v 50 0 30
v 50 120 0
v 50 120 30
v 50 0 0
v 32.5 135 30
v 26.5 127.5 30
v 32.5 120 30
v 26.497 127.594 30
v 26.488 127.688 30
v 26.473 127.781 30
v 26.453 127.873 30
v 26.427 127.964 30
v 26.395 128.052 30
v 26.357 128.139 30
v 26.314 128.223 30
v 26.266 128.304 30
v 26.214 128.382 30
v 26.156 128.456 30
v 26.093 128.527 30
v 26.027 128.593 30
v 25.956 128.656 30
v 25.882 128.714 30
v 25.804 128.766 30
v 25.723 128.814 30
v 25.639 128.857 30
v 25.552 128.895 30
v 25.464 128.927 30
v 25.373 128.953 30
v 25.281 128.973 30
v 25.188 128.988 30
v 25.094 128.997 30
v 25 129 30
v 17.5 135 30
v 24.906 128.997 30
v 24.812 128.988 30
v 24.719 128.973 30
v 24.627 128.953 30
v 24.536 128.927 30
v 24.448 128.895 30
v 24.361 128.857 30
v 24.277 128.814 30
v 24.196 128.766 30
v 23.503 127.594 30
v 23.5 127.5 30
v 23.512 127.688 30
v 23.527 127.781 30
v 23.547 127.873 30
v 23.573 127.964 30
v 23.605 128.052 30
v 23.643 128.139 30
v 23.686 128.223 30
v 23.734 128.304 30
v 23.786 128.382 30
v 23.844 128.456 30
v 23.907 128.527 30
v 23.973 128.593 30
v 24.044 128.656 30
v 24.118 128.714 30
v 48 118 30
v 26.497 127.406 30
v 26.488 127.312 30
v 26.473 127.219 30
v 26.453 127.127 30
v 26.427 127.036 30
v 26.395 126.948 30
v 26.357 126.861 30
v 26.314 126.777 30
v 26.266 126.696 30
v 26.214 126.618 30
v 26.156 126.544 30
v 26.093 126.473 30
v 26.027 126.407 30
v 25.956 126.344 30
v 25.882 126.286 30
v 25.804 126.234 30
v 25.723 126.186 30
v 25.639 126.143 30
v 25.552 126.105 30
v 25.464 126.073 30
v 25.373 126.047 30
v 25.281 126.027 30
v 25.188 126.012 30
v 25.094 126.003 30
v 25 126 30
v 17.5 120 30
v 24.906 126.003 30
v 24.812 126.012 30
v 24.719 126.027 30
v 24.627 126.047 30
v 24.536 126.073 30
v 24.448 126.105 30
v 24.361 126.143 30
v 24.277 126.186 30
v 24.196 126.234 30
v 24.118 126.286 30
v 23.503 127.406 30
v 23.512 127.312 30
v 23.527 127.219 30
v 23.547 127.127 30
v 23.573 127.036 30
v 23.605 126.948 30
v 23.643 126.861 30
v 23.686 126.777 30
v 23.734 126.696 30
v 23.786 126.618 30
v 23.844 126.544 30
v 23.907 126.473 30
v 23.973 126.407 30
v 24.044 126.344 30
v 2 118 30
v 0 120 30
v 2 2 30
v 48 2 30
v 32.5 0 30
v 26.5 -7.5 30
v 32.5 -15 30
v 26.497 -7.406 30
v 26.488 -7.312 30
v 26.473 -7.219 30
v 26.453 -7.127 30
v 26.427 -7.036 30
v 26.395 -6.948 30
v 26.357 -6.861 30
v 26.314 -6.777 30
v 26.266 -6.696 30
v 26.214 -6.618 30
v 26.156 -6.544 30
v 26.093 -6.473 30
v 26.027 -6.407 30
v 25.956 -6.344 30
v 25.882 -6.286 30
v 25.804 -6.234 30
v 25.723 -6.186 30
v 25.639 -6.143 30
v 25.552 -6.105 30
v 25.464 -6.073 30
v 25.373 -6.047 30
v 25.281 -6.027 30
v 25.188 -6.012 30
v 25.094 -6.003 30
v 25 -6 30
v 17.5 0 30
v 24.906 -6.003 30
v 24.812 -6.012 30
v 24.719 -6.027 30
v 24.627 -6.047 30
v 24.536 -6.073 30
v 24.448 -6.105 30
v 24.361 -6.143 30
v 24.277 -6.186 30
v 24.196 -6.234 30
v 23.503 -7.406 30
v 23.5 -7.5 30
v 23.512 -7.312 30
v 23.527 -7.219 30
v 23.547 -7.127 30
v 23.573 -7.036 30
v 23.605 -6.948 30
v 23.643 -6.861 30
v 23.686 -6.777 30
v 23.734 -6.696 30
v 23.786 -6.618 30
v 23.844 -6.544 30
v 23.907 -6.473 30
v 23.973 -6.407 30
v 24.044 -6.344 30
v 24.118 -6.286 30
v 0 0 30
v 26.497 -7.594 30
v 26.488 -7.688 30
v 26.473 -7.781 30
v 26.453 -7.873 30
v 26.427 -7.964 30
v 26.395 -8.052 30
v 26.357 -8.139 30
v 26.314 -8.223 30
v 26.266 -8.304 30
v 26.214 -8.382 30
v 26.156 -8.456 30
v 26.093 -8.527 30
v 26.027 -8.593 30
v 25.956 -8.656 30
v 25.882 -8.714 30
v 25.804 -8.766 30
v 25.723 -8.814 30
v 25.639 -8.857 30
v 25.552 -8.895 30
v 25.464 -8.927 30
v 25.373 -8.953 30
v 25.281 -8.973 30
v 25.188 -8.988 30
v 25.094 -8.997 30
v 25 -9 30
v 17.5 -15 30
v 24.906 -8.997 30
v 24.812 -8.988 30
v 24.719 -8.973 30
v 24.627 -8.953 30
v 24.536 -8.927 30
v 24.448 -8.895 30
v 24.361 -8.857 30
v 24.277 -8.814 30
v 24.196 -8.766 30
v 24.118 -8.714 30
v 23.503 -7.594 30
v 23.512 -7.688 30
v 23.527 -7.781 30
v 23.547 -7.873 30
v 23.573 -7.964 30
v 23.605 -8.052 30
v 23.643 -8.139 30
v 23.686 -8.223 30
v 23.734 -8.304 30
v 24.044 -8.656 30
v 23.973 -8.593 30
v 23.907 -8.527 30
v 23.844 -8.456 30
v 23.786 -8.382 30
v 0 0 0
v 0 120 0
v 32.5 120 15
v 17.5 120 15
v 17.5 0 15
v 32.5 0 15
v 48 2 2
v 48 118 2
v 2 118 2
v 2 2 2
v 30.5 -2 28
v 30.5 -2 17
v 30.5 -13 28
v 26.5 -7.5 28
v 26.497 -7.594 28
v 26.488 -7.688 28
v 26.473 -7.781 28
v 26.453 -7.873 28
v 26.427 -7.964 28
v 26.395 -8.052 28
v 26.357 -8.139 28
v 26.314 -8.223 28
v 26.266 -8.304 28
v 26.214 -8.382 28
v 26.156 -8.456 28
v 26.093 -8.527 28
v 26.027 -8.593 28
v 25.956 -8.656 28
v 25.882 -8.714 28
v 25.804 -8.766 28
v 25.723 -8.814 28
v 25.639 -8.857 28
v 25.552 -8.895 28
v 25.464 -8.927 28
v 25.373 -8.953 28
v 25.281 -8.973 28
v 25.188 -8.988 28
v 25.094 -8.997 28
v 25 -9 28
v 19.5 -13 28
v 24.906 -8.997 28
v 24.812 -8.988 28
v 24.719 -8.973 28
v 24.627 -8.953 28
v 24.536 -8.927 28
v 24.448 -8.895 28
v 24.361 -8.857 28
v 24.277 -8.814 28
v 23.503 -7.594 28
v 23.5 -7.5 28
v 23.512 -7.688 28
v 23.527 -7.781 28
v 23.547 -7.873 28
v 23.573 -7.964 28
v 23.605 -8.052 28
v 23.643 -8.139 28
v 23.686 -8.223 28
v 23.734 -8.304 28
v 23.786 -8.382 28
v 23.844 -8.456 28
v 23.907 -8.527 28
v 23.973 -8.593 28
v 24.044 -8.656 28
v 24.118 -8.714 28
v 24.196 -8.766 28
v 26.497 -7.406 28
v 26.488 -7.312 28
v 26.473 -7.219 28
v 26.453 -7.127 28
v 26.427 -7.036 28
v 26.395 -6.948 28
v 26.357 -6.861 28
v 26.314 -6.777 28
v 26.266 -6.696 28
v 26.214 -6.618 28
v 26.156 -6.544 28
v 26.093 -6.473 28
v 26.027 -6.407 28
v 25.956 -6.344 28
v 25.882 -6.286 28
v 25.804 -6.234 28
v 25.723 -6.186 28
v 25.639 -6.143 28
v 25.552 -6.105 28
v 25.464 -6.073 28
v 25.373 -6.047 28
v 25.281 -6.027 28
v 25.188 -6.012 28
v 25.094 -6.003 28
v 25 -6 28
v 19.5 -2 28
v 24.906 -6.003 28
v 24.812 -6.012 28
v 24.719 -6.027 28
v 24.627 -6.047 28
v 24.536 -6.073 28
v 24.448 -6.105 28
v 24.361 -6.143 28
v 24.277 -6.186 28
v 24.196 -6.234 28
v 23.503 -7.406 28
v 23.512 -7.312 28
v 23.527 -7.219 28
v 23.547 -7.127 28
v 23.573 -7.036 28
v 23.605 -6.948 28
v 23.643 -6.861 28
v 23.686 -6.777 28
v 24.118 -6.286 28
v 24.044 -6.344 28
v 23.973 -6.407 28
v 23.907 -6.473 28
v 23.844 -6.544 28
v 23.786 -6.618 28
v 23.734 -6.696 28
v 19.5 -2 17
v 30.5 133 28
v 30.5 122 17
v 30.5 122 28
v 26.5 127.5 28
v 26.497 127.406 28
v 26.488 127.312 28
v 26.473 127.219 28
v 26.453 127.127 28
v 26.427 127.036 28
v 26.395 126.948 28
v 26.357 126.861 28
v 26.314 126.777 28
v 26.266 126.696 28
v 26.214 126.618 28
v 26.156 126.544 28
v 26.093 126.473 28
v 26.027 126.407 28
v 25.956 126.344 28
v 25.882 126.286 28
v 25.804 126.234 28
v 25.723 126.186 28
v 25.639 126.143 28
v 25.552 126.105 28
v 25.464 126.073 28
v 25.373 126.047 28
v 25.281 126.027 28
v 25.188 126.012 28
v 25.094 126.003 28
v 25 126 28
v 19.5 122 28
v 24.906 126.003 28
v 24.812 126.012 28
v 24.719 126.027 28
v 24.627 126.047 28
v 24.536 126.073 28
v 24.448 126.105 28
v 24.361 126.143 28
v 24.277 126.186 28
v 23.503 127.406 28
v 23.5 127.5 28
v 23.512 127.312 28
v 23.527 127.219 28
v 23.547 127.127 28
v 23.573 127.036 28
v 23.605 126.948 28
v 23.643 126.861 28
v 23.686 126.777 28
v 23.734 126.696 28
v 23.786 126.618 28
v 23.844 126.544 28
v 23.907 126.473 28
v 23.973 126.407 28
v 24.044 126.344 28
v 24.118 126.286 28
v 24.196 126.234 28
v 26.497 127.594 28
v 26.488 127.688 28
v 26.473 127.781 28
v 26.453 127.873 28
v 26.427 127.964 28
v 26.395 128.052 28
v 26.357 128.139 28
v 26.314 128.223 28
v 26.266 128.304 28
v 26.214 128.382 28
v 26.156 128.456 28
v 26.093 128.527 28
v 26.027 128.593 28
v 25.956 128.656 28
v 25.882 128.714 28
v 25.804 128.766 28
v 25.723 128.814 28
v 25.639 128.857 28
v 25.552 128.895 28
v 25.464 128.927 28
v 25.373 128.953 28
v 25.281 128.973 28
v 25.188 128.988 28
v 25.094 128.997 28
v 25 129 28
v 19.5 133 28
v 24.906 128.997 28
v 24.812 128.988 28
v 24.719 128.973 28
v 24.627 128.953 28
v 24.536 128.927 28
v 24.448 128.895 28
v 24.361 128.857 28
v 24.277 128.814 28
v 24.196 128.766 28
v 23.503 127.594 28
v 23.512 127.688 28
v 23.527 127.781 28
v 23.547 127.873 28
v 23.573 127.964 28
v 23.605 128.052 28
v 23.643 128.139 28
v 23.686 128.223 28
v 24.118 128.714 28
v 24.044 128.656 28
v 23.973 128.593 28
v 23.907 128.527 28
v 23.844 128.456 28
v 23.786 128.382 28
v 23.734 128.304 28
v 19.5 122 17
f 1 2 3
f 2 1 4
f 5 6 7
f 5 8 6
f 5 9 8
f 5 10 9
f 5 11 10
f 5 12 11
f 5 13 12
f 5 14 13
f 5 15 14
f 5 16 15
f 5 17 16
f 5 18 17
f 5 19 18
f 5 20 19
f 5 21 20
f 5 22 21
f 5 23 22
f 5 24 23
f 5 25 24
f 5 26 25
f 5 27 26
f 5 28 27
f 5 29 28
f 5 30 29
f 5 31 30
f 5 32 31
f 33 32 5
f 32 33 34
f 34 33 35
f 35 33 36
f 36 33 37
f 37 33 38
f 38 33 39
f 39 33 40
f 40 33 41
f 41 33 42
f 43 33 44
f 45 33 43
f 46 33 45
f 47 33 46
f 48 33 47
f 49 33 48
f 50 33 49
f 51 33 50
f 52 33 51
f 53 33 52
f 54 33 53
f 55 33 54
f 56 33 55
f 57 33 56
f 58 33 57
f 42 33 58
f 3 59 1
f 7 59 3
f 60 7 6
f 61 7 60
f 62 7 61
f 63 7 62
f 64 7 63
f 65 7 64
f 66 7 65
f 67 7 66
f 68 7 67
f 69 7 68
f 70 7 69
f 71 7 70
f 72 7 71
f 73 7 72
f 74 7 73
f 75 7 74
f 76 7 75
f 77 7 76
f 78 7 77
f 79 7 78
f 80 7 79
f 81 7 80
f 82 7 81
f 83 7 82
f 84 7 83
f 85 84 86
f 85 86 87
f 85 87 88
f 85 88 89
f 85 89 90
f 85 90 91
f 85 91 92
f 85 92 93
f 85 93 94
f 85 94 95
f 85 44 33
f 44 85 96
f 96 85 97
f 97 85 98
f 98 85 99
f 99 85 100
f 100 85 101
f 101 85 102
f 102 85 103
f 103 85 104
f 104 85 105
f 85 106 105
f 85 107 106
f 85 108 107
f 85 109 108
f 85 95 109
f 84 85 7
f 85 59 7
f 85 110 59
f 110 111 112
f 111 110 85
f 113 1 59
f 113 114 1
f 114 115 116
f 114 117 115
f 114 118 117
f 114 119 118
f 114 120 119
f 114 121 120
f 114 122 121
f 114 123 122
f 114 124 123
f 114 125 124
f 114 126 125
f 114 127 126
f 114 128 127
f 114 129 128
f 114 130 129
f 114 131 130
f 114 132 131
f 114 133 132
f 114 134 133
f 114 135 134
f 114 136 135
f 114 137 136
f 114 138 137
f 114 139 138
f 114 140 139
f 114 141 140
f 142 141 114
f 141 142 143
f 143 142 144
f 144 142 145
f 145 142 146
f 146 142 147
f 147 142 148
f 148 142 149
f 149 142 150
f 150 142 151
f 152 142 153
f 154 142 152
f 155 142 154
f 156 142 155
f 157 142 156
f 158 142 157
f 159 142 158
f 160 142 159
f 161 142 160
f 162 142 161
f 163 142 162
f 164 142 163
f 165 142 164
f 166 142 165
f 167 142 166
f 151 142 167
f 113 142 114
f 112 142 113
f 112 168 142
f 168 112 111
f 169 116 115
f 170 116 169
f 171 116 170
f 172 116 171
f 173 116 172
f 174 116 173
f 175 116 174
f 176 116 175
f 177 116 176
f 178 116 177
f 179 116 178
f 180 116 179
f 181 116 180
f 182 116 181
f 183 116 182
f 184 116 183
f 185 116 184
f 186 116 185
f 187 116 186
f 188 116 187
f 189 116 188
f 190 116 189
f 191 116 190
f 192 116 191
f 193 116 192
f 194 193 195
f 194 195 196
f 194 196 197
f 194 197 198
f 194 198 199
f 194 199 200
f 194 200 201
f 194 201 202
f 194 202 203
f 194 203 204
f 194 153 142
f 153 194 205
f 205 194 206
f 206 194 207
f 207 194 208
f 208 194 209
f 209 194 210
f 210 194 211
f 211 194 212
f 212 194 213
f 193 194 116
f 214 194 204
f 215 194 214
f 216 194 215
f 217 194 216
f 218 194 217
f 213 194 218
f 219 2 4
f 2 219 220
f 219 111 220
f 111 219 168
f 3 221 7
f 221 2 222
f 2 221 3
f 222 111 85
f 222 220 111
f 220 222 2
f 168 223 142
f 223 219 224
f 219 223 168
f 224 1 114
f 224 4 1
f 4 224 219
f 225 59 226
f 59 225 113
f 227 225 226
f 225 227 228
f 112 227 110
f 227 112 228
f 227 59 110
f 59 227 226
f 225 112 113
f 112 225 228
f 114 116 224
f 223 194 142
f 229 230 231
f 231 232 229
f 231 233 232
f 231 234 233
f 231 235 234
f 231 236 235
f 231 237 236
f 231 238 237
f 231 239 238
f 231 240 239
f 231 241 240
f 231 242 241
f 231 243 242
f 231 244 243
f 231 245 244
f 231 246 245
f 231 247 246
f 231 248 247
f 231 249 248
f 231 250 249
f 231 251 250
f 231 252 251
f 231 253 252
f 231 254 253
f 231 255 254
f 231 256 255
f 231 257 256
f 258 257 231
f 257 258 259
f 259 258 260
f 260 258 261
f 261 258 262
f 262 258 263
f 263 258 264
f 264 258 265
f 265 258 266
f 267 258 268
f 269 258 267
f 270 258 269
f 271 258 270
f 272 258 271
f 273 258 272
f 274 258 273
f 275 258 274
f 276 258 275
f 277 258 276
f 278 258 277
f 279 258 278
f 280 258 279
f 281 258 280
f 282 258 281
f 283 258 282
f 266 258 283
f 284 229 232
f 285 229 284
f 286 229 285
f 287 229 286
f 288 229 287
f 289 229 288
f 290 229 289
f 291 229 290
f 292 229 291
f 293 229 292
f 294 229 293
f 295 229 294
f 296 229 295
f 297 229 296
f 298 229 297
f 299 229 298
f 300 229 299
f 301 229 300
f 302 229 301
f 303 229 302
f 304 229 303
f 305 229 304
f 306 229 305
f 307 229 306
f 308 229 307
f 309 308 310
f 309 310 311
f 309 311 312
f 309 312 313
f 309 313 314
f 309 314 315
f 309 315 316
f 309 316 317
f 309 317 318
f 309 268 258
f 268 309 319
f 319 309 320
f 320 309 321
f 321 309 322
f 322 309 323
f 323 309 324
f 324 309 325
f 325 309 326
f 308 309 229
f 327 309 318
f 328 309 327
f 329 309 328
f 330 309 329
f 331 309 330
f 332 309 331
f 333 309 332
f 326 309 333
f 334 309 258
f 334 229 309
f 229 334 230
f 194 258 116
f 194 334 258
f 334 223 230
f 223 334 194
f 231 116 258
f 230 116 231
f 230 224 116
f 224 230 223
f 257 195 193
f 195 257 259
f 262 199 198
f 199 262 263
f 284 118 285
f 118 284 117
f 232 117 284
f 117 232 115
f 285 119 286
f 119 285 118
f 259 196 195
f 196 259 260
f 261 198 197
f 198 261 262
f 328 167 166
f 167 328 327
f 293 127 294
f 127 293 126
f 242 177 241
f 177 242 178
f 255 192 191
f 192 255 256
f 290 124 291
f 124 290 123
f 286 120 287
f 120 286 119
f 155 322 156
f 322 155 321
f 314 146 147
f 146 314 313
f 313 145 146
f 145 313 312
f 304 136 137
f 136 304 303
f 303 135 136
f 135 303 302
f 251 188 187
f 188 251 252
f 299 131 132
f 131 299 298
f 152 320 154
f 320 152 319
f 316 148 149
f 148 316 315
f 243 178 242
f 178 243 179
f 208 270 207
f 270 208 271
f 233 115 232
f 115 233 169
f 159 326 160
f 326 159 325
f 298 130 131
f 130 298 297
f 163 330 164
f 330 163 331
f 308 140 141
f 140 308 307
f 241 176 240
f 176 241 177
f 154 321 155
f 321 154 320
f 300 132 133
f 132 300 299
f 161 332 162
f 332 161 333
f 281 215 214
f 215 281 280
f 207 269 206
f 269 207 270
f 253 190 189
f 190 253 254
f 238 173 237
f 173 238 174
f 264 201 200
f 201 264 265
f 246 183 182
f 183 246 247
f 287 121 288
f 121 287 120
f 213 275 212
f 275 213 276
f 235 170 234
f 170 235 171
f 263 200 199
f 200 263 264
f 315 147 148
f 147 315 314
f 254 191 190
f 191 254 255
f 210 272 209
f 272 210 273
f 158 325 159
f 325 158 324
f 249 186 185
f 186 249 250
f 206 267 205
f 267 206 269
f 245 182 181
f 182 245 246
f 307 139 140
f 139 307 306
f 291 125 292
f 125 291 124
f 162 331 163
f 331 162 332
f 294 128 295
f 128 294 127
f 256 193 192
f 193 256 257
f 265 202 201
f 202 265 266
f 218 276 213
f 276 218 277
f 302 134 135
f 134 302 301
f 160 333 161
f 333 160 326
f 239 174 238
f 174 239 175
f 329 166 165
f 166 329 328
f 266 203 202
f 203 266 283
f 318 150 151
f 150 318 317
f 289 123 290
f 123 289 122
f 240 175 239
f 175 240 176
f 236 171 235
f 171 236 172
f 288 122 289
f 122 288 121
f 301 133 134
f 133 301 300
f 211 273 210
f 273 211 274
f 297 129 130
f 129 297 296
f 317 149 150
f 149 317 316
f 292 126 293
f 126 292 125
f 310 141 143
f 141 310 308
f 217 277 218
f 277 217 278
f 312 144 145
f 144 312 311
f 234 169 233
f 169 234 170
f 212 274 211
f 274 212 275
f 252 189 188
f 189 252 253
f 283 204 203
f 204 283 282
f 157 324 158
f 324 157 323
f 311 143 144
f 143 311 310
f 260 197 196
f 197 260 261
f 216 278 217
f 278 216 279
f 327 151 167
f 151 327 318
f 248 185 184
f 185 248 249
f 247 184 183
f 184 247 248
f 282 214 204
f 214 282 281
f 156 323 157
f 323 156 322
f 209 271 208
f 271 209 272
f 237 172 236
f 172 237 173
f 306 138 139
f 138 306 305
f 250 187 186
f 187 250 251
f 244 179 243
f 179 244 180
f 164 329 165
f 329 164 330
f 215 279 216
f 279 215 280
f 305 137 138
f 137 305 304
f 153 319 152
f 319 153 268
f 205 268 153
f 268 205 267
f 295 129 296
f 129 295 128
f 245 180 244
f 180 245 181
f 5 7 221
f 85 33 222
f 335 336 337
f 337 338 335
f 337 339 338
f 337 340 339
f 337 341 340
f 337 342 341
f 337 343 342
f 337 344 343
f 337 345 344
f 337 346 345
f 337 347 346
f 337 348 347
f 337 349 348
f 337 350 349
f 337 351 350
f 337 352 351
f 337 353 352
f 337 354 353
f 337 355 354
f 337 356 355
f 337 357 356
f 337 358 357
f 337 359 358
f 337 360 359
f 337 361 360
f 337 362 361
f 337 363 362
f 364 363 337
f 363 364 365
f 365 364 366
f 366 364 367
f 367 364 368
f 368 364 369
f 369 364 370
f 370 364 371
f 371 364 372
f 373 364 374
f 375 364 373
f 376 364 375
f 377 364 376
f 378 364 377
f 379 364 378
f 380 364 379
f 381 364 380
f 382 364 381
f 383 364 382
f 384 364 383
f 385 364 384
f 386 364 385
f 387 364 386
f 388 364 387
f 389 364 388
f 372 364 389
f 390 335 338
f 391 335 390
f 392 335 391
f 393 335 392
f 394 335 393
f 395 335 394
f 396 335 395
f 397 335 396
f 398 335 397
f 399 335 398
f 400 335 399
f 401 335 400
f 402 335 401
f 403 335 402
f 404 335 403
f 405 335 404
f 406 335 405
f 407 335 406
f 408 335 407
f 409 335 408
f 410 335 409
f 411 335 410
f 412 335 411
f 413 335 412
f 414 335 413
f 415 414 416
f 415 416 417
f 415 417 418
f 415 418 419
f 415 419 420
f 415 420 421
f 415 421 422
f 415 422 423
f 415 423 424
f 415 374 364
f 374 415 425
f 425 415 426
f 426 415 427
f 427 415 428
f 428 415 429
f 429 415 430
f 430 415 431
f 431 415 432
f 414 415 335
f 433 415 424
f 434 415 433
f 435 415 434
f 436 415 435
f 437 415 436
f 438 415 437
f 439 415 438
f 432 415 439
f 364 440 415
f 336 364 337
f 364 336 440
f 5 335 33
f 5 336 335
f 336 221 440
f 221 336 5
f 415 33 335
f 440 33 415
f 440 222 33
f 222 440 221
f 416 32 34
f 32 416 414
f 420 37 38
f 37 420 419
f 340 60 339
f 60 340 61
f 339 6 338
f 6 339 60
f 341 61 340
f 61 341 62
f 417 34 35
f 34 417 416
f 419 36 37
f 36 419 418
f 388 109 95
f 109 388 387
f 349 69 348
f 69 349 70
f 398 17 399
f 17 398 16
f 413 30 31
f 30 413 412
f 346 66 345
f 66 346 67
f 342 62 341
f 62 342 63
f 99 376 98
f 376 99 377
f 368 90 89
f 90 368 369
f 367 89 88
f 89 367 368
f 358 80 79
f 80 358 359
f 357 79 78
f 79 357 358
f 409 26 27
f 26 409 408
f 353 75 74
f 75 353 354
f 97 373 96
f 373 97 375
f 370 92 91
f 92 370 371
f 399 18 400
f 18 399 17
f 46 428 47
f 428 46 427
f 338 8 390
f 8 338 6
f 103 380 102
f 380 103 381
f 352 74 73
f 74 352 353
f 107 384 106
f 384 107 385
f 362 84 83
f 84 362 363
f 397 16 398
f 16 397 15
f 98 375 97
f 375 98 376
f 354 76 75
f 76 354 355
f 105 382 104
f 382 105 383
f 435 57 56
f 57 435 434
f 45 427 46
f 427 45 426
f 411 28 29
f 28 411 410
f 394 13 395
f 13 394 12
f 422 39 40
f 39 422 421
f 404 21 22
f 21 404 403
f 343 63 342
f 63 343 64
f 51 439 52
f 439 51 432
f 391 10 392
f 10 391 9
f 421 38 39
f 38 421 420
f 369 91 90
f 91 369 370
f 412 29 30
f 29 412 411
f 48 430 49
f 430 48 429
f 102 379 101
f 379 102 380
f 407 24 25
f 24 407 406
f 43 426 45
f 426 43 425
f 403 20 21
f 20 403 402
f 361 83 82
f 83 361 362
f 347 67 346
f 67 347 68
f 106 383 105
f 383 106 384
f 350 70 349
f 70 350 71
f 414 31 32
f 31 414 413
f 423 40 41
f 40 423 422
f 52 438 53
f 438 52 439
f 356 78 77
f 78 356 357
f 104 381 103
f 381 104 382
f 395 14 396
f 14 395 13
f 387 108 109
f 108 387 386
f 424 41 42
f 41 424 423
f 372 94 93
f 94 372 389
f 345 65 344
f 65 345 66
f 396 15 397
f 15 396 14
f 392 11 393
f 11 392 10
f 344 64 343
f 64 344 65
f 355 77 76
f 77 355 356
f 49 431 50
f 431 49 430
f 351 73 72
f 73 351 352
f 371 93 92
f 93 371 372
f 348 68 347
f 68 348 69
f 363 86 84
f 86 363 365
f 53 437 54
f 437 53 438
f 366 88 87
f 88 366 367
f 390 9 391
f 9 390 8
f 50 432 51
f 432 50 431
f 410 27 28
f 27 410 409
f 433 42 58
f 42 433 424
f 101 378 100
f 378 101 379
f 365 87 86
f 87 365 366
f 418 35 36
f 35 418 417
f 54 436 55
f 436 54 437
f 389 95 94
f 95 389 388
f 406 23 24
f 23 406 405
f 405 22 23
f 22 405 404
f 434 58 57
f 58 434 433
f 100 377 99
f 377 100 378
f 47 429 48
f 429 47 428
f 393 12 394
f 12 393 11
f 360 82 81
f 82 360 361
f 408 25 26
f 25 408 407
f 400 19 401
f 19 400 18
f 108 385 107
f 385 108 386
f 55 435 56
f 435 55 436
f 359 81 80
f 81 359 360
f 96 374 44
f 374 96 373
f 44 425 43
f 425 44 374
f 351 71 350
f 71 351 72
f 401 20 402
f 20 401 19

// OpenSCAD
// Wall Thickness in mm (this is subtracted from the inner space of the cover, all other dimensions are outer measurements. height of 20mm, wall thickness of 1mm gives a usable inner space of 19mm height)
thickness = 2; // [0.2:0.1:50]

//Length of cover im mm (does not include screw-holders)
length = 120; // [1:1000]

//Width of cover in mm
width = 50; // [1:1000]

//Height of cover in mm
height = 30; // [1:1000]

//Width of the screwholder in mm on the side of the cover
screwholder_width = 15; // [1:100]

//How far the screwholder stands out from the cover in mm
screwholder_length = 15; // [1:100]

//How high on the box should the screwholder start to grow, higher value will lessen the overhang
screwholder_height = 15; // [1:100]

//Screhole diameter in mm 
screwhole_d = 3; // [1:100]

module screwholder() {
    difference() {
        union() {
            resize([screwholder_width, screwholder_length, screwholder_height])
            cube();
            
        }
        
        translate([thickness, 0, 0])
        resize([screwholder_width - thickness*2, screwholder_length - thickness, screwholder_height - thickness])
        cube();
        
        resize([screwholder_width+0.01, screwholder_length, screwholder_height])
        translate([0,0,1])
        rotate([0,90,0])
        linear_extrude(height=1)
        polygon(points = [[0,0], [1,0], [1,1]]);
        
        translate([screwholder_width/2, screwholder_length/2,screwholder_height-thickness])
        cylinder(d=screwhole_d, h=thickness, $fn=100);
    }
}




union() {

    difference() {
        resize([width, length, height])
        cube();
        
        translate([thickness, thickness, thickness])
        resize([width - thickness*2, length - thickness*2, height - thickness])
        cube();
    }
    
    translate([width/2 - screwholder_width/2, -screwholder_length, height - screwholder_height])
    screwholder();
    
    
    translate([width/2 - screwholder_width/2, length + screwholder_length, height - screwholder_height])
    mirror([0,1,0])
    screwholder();
}
